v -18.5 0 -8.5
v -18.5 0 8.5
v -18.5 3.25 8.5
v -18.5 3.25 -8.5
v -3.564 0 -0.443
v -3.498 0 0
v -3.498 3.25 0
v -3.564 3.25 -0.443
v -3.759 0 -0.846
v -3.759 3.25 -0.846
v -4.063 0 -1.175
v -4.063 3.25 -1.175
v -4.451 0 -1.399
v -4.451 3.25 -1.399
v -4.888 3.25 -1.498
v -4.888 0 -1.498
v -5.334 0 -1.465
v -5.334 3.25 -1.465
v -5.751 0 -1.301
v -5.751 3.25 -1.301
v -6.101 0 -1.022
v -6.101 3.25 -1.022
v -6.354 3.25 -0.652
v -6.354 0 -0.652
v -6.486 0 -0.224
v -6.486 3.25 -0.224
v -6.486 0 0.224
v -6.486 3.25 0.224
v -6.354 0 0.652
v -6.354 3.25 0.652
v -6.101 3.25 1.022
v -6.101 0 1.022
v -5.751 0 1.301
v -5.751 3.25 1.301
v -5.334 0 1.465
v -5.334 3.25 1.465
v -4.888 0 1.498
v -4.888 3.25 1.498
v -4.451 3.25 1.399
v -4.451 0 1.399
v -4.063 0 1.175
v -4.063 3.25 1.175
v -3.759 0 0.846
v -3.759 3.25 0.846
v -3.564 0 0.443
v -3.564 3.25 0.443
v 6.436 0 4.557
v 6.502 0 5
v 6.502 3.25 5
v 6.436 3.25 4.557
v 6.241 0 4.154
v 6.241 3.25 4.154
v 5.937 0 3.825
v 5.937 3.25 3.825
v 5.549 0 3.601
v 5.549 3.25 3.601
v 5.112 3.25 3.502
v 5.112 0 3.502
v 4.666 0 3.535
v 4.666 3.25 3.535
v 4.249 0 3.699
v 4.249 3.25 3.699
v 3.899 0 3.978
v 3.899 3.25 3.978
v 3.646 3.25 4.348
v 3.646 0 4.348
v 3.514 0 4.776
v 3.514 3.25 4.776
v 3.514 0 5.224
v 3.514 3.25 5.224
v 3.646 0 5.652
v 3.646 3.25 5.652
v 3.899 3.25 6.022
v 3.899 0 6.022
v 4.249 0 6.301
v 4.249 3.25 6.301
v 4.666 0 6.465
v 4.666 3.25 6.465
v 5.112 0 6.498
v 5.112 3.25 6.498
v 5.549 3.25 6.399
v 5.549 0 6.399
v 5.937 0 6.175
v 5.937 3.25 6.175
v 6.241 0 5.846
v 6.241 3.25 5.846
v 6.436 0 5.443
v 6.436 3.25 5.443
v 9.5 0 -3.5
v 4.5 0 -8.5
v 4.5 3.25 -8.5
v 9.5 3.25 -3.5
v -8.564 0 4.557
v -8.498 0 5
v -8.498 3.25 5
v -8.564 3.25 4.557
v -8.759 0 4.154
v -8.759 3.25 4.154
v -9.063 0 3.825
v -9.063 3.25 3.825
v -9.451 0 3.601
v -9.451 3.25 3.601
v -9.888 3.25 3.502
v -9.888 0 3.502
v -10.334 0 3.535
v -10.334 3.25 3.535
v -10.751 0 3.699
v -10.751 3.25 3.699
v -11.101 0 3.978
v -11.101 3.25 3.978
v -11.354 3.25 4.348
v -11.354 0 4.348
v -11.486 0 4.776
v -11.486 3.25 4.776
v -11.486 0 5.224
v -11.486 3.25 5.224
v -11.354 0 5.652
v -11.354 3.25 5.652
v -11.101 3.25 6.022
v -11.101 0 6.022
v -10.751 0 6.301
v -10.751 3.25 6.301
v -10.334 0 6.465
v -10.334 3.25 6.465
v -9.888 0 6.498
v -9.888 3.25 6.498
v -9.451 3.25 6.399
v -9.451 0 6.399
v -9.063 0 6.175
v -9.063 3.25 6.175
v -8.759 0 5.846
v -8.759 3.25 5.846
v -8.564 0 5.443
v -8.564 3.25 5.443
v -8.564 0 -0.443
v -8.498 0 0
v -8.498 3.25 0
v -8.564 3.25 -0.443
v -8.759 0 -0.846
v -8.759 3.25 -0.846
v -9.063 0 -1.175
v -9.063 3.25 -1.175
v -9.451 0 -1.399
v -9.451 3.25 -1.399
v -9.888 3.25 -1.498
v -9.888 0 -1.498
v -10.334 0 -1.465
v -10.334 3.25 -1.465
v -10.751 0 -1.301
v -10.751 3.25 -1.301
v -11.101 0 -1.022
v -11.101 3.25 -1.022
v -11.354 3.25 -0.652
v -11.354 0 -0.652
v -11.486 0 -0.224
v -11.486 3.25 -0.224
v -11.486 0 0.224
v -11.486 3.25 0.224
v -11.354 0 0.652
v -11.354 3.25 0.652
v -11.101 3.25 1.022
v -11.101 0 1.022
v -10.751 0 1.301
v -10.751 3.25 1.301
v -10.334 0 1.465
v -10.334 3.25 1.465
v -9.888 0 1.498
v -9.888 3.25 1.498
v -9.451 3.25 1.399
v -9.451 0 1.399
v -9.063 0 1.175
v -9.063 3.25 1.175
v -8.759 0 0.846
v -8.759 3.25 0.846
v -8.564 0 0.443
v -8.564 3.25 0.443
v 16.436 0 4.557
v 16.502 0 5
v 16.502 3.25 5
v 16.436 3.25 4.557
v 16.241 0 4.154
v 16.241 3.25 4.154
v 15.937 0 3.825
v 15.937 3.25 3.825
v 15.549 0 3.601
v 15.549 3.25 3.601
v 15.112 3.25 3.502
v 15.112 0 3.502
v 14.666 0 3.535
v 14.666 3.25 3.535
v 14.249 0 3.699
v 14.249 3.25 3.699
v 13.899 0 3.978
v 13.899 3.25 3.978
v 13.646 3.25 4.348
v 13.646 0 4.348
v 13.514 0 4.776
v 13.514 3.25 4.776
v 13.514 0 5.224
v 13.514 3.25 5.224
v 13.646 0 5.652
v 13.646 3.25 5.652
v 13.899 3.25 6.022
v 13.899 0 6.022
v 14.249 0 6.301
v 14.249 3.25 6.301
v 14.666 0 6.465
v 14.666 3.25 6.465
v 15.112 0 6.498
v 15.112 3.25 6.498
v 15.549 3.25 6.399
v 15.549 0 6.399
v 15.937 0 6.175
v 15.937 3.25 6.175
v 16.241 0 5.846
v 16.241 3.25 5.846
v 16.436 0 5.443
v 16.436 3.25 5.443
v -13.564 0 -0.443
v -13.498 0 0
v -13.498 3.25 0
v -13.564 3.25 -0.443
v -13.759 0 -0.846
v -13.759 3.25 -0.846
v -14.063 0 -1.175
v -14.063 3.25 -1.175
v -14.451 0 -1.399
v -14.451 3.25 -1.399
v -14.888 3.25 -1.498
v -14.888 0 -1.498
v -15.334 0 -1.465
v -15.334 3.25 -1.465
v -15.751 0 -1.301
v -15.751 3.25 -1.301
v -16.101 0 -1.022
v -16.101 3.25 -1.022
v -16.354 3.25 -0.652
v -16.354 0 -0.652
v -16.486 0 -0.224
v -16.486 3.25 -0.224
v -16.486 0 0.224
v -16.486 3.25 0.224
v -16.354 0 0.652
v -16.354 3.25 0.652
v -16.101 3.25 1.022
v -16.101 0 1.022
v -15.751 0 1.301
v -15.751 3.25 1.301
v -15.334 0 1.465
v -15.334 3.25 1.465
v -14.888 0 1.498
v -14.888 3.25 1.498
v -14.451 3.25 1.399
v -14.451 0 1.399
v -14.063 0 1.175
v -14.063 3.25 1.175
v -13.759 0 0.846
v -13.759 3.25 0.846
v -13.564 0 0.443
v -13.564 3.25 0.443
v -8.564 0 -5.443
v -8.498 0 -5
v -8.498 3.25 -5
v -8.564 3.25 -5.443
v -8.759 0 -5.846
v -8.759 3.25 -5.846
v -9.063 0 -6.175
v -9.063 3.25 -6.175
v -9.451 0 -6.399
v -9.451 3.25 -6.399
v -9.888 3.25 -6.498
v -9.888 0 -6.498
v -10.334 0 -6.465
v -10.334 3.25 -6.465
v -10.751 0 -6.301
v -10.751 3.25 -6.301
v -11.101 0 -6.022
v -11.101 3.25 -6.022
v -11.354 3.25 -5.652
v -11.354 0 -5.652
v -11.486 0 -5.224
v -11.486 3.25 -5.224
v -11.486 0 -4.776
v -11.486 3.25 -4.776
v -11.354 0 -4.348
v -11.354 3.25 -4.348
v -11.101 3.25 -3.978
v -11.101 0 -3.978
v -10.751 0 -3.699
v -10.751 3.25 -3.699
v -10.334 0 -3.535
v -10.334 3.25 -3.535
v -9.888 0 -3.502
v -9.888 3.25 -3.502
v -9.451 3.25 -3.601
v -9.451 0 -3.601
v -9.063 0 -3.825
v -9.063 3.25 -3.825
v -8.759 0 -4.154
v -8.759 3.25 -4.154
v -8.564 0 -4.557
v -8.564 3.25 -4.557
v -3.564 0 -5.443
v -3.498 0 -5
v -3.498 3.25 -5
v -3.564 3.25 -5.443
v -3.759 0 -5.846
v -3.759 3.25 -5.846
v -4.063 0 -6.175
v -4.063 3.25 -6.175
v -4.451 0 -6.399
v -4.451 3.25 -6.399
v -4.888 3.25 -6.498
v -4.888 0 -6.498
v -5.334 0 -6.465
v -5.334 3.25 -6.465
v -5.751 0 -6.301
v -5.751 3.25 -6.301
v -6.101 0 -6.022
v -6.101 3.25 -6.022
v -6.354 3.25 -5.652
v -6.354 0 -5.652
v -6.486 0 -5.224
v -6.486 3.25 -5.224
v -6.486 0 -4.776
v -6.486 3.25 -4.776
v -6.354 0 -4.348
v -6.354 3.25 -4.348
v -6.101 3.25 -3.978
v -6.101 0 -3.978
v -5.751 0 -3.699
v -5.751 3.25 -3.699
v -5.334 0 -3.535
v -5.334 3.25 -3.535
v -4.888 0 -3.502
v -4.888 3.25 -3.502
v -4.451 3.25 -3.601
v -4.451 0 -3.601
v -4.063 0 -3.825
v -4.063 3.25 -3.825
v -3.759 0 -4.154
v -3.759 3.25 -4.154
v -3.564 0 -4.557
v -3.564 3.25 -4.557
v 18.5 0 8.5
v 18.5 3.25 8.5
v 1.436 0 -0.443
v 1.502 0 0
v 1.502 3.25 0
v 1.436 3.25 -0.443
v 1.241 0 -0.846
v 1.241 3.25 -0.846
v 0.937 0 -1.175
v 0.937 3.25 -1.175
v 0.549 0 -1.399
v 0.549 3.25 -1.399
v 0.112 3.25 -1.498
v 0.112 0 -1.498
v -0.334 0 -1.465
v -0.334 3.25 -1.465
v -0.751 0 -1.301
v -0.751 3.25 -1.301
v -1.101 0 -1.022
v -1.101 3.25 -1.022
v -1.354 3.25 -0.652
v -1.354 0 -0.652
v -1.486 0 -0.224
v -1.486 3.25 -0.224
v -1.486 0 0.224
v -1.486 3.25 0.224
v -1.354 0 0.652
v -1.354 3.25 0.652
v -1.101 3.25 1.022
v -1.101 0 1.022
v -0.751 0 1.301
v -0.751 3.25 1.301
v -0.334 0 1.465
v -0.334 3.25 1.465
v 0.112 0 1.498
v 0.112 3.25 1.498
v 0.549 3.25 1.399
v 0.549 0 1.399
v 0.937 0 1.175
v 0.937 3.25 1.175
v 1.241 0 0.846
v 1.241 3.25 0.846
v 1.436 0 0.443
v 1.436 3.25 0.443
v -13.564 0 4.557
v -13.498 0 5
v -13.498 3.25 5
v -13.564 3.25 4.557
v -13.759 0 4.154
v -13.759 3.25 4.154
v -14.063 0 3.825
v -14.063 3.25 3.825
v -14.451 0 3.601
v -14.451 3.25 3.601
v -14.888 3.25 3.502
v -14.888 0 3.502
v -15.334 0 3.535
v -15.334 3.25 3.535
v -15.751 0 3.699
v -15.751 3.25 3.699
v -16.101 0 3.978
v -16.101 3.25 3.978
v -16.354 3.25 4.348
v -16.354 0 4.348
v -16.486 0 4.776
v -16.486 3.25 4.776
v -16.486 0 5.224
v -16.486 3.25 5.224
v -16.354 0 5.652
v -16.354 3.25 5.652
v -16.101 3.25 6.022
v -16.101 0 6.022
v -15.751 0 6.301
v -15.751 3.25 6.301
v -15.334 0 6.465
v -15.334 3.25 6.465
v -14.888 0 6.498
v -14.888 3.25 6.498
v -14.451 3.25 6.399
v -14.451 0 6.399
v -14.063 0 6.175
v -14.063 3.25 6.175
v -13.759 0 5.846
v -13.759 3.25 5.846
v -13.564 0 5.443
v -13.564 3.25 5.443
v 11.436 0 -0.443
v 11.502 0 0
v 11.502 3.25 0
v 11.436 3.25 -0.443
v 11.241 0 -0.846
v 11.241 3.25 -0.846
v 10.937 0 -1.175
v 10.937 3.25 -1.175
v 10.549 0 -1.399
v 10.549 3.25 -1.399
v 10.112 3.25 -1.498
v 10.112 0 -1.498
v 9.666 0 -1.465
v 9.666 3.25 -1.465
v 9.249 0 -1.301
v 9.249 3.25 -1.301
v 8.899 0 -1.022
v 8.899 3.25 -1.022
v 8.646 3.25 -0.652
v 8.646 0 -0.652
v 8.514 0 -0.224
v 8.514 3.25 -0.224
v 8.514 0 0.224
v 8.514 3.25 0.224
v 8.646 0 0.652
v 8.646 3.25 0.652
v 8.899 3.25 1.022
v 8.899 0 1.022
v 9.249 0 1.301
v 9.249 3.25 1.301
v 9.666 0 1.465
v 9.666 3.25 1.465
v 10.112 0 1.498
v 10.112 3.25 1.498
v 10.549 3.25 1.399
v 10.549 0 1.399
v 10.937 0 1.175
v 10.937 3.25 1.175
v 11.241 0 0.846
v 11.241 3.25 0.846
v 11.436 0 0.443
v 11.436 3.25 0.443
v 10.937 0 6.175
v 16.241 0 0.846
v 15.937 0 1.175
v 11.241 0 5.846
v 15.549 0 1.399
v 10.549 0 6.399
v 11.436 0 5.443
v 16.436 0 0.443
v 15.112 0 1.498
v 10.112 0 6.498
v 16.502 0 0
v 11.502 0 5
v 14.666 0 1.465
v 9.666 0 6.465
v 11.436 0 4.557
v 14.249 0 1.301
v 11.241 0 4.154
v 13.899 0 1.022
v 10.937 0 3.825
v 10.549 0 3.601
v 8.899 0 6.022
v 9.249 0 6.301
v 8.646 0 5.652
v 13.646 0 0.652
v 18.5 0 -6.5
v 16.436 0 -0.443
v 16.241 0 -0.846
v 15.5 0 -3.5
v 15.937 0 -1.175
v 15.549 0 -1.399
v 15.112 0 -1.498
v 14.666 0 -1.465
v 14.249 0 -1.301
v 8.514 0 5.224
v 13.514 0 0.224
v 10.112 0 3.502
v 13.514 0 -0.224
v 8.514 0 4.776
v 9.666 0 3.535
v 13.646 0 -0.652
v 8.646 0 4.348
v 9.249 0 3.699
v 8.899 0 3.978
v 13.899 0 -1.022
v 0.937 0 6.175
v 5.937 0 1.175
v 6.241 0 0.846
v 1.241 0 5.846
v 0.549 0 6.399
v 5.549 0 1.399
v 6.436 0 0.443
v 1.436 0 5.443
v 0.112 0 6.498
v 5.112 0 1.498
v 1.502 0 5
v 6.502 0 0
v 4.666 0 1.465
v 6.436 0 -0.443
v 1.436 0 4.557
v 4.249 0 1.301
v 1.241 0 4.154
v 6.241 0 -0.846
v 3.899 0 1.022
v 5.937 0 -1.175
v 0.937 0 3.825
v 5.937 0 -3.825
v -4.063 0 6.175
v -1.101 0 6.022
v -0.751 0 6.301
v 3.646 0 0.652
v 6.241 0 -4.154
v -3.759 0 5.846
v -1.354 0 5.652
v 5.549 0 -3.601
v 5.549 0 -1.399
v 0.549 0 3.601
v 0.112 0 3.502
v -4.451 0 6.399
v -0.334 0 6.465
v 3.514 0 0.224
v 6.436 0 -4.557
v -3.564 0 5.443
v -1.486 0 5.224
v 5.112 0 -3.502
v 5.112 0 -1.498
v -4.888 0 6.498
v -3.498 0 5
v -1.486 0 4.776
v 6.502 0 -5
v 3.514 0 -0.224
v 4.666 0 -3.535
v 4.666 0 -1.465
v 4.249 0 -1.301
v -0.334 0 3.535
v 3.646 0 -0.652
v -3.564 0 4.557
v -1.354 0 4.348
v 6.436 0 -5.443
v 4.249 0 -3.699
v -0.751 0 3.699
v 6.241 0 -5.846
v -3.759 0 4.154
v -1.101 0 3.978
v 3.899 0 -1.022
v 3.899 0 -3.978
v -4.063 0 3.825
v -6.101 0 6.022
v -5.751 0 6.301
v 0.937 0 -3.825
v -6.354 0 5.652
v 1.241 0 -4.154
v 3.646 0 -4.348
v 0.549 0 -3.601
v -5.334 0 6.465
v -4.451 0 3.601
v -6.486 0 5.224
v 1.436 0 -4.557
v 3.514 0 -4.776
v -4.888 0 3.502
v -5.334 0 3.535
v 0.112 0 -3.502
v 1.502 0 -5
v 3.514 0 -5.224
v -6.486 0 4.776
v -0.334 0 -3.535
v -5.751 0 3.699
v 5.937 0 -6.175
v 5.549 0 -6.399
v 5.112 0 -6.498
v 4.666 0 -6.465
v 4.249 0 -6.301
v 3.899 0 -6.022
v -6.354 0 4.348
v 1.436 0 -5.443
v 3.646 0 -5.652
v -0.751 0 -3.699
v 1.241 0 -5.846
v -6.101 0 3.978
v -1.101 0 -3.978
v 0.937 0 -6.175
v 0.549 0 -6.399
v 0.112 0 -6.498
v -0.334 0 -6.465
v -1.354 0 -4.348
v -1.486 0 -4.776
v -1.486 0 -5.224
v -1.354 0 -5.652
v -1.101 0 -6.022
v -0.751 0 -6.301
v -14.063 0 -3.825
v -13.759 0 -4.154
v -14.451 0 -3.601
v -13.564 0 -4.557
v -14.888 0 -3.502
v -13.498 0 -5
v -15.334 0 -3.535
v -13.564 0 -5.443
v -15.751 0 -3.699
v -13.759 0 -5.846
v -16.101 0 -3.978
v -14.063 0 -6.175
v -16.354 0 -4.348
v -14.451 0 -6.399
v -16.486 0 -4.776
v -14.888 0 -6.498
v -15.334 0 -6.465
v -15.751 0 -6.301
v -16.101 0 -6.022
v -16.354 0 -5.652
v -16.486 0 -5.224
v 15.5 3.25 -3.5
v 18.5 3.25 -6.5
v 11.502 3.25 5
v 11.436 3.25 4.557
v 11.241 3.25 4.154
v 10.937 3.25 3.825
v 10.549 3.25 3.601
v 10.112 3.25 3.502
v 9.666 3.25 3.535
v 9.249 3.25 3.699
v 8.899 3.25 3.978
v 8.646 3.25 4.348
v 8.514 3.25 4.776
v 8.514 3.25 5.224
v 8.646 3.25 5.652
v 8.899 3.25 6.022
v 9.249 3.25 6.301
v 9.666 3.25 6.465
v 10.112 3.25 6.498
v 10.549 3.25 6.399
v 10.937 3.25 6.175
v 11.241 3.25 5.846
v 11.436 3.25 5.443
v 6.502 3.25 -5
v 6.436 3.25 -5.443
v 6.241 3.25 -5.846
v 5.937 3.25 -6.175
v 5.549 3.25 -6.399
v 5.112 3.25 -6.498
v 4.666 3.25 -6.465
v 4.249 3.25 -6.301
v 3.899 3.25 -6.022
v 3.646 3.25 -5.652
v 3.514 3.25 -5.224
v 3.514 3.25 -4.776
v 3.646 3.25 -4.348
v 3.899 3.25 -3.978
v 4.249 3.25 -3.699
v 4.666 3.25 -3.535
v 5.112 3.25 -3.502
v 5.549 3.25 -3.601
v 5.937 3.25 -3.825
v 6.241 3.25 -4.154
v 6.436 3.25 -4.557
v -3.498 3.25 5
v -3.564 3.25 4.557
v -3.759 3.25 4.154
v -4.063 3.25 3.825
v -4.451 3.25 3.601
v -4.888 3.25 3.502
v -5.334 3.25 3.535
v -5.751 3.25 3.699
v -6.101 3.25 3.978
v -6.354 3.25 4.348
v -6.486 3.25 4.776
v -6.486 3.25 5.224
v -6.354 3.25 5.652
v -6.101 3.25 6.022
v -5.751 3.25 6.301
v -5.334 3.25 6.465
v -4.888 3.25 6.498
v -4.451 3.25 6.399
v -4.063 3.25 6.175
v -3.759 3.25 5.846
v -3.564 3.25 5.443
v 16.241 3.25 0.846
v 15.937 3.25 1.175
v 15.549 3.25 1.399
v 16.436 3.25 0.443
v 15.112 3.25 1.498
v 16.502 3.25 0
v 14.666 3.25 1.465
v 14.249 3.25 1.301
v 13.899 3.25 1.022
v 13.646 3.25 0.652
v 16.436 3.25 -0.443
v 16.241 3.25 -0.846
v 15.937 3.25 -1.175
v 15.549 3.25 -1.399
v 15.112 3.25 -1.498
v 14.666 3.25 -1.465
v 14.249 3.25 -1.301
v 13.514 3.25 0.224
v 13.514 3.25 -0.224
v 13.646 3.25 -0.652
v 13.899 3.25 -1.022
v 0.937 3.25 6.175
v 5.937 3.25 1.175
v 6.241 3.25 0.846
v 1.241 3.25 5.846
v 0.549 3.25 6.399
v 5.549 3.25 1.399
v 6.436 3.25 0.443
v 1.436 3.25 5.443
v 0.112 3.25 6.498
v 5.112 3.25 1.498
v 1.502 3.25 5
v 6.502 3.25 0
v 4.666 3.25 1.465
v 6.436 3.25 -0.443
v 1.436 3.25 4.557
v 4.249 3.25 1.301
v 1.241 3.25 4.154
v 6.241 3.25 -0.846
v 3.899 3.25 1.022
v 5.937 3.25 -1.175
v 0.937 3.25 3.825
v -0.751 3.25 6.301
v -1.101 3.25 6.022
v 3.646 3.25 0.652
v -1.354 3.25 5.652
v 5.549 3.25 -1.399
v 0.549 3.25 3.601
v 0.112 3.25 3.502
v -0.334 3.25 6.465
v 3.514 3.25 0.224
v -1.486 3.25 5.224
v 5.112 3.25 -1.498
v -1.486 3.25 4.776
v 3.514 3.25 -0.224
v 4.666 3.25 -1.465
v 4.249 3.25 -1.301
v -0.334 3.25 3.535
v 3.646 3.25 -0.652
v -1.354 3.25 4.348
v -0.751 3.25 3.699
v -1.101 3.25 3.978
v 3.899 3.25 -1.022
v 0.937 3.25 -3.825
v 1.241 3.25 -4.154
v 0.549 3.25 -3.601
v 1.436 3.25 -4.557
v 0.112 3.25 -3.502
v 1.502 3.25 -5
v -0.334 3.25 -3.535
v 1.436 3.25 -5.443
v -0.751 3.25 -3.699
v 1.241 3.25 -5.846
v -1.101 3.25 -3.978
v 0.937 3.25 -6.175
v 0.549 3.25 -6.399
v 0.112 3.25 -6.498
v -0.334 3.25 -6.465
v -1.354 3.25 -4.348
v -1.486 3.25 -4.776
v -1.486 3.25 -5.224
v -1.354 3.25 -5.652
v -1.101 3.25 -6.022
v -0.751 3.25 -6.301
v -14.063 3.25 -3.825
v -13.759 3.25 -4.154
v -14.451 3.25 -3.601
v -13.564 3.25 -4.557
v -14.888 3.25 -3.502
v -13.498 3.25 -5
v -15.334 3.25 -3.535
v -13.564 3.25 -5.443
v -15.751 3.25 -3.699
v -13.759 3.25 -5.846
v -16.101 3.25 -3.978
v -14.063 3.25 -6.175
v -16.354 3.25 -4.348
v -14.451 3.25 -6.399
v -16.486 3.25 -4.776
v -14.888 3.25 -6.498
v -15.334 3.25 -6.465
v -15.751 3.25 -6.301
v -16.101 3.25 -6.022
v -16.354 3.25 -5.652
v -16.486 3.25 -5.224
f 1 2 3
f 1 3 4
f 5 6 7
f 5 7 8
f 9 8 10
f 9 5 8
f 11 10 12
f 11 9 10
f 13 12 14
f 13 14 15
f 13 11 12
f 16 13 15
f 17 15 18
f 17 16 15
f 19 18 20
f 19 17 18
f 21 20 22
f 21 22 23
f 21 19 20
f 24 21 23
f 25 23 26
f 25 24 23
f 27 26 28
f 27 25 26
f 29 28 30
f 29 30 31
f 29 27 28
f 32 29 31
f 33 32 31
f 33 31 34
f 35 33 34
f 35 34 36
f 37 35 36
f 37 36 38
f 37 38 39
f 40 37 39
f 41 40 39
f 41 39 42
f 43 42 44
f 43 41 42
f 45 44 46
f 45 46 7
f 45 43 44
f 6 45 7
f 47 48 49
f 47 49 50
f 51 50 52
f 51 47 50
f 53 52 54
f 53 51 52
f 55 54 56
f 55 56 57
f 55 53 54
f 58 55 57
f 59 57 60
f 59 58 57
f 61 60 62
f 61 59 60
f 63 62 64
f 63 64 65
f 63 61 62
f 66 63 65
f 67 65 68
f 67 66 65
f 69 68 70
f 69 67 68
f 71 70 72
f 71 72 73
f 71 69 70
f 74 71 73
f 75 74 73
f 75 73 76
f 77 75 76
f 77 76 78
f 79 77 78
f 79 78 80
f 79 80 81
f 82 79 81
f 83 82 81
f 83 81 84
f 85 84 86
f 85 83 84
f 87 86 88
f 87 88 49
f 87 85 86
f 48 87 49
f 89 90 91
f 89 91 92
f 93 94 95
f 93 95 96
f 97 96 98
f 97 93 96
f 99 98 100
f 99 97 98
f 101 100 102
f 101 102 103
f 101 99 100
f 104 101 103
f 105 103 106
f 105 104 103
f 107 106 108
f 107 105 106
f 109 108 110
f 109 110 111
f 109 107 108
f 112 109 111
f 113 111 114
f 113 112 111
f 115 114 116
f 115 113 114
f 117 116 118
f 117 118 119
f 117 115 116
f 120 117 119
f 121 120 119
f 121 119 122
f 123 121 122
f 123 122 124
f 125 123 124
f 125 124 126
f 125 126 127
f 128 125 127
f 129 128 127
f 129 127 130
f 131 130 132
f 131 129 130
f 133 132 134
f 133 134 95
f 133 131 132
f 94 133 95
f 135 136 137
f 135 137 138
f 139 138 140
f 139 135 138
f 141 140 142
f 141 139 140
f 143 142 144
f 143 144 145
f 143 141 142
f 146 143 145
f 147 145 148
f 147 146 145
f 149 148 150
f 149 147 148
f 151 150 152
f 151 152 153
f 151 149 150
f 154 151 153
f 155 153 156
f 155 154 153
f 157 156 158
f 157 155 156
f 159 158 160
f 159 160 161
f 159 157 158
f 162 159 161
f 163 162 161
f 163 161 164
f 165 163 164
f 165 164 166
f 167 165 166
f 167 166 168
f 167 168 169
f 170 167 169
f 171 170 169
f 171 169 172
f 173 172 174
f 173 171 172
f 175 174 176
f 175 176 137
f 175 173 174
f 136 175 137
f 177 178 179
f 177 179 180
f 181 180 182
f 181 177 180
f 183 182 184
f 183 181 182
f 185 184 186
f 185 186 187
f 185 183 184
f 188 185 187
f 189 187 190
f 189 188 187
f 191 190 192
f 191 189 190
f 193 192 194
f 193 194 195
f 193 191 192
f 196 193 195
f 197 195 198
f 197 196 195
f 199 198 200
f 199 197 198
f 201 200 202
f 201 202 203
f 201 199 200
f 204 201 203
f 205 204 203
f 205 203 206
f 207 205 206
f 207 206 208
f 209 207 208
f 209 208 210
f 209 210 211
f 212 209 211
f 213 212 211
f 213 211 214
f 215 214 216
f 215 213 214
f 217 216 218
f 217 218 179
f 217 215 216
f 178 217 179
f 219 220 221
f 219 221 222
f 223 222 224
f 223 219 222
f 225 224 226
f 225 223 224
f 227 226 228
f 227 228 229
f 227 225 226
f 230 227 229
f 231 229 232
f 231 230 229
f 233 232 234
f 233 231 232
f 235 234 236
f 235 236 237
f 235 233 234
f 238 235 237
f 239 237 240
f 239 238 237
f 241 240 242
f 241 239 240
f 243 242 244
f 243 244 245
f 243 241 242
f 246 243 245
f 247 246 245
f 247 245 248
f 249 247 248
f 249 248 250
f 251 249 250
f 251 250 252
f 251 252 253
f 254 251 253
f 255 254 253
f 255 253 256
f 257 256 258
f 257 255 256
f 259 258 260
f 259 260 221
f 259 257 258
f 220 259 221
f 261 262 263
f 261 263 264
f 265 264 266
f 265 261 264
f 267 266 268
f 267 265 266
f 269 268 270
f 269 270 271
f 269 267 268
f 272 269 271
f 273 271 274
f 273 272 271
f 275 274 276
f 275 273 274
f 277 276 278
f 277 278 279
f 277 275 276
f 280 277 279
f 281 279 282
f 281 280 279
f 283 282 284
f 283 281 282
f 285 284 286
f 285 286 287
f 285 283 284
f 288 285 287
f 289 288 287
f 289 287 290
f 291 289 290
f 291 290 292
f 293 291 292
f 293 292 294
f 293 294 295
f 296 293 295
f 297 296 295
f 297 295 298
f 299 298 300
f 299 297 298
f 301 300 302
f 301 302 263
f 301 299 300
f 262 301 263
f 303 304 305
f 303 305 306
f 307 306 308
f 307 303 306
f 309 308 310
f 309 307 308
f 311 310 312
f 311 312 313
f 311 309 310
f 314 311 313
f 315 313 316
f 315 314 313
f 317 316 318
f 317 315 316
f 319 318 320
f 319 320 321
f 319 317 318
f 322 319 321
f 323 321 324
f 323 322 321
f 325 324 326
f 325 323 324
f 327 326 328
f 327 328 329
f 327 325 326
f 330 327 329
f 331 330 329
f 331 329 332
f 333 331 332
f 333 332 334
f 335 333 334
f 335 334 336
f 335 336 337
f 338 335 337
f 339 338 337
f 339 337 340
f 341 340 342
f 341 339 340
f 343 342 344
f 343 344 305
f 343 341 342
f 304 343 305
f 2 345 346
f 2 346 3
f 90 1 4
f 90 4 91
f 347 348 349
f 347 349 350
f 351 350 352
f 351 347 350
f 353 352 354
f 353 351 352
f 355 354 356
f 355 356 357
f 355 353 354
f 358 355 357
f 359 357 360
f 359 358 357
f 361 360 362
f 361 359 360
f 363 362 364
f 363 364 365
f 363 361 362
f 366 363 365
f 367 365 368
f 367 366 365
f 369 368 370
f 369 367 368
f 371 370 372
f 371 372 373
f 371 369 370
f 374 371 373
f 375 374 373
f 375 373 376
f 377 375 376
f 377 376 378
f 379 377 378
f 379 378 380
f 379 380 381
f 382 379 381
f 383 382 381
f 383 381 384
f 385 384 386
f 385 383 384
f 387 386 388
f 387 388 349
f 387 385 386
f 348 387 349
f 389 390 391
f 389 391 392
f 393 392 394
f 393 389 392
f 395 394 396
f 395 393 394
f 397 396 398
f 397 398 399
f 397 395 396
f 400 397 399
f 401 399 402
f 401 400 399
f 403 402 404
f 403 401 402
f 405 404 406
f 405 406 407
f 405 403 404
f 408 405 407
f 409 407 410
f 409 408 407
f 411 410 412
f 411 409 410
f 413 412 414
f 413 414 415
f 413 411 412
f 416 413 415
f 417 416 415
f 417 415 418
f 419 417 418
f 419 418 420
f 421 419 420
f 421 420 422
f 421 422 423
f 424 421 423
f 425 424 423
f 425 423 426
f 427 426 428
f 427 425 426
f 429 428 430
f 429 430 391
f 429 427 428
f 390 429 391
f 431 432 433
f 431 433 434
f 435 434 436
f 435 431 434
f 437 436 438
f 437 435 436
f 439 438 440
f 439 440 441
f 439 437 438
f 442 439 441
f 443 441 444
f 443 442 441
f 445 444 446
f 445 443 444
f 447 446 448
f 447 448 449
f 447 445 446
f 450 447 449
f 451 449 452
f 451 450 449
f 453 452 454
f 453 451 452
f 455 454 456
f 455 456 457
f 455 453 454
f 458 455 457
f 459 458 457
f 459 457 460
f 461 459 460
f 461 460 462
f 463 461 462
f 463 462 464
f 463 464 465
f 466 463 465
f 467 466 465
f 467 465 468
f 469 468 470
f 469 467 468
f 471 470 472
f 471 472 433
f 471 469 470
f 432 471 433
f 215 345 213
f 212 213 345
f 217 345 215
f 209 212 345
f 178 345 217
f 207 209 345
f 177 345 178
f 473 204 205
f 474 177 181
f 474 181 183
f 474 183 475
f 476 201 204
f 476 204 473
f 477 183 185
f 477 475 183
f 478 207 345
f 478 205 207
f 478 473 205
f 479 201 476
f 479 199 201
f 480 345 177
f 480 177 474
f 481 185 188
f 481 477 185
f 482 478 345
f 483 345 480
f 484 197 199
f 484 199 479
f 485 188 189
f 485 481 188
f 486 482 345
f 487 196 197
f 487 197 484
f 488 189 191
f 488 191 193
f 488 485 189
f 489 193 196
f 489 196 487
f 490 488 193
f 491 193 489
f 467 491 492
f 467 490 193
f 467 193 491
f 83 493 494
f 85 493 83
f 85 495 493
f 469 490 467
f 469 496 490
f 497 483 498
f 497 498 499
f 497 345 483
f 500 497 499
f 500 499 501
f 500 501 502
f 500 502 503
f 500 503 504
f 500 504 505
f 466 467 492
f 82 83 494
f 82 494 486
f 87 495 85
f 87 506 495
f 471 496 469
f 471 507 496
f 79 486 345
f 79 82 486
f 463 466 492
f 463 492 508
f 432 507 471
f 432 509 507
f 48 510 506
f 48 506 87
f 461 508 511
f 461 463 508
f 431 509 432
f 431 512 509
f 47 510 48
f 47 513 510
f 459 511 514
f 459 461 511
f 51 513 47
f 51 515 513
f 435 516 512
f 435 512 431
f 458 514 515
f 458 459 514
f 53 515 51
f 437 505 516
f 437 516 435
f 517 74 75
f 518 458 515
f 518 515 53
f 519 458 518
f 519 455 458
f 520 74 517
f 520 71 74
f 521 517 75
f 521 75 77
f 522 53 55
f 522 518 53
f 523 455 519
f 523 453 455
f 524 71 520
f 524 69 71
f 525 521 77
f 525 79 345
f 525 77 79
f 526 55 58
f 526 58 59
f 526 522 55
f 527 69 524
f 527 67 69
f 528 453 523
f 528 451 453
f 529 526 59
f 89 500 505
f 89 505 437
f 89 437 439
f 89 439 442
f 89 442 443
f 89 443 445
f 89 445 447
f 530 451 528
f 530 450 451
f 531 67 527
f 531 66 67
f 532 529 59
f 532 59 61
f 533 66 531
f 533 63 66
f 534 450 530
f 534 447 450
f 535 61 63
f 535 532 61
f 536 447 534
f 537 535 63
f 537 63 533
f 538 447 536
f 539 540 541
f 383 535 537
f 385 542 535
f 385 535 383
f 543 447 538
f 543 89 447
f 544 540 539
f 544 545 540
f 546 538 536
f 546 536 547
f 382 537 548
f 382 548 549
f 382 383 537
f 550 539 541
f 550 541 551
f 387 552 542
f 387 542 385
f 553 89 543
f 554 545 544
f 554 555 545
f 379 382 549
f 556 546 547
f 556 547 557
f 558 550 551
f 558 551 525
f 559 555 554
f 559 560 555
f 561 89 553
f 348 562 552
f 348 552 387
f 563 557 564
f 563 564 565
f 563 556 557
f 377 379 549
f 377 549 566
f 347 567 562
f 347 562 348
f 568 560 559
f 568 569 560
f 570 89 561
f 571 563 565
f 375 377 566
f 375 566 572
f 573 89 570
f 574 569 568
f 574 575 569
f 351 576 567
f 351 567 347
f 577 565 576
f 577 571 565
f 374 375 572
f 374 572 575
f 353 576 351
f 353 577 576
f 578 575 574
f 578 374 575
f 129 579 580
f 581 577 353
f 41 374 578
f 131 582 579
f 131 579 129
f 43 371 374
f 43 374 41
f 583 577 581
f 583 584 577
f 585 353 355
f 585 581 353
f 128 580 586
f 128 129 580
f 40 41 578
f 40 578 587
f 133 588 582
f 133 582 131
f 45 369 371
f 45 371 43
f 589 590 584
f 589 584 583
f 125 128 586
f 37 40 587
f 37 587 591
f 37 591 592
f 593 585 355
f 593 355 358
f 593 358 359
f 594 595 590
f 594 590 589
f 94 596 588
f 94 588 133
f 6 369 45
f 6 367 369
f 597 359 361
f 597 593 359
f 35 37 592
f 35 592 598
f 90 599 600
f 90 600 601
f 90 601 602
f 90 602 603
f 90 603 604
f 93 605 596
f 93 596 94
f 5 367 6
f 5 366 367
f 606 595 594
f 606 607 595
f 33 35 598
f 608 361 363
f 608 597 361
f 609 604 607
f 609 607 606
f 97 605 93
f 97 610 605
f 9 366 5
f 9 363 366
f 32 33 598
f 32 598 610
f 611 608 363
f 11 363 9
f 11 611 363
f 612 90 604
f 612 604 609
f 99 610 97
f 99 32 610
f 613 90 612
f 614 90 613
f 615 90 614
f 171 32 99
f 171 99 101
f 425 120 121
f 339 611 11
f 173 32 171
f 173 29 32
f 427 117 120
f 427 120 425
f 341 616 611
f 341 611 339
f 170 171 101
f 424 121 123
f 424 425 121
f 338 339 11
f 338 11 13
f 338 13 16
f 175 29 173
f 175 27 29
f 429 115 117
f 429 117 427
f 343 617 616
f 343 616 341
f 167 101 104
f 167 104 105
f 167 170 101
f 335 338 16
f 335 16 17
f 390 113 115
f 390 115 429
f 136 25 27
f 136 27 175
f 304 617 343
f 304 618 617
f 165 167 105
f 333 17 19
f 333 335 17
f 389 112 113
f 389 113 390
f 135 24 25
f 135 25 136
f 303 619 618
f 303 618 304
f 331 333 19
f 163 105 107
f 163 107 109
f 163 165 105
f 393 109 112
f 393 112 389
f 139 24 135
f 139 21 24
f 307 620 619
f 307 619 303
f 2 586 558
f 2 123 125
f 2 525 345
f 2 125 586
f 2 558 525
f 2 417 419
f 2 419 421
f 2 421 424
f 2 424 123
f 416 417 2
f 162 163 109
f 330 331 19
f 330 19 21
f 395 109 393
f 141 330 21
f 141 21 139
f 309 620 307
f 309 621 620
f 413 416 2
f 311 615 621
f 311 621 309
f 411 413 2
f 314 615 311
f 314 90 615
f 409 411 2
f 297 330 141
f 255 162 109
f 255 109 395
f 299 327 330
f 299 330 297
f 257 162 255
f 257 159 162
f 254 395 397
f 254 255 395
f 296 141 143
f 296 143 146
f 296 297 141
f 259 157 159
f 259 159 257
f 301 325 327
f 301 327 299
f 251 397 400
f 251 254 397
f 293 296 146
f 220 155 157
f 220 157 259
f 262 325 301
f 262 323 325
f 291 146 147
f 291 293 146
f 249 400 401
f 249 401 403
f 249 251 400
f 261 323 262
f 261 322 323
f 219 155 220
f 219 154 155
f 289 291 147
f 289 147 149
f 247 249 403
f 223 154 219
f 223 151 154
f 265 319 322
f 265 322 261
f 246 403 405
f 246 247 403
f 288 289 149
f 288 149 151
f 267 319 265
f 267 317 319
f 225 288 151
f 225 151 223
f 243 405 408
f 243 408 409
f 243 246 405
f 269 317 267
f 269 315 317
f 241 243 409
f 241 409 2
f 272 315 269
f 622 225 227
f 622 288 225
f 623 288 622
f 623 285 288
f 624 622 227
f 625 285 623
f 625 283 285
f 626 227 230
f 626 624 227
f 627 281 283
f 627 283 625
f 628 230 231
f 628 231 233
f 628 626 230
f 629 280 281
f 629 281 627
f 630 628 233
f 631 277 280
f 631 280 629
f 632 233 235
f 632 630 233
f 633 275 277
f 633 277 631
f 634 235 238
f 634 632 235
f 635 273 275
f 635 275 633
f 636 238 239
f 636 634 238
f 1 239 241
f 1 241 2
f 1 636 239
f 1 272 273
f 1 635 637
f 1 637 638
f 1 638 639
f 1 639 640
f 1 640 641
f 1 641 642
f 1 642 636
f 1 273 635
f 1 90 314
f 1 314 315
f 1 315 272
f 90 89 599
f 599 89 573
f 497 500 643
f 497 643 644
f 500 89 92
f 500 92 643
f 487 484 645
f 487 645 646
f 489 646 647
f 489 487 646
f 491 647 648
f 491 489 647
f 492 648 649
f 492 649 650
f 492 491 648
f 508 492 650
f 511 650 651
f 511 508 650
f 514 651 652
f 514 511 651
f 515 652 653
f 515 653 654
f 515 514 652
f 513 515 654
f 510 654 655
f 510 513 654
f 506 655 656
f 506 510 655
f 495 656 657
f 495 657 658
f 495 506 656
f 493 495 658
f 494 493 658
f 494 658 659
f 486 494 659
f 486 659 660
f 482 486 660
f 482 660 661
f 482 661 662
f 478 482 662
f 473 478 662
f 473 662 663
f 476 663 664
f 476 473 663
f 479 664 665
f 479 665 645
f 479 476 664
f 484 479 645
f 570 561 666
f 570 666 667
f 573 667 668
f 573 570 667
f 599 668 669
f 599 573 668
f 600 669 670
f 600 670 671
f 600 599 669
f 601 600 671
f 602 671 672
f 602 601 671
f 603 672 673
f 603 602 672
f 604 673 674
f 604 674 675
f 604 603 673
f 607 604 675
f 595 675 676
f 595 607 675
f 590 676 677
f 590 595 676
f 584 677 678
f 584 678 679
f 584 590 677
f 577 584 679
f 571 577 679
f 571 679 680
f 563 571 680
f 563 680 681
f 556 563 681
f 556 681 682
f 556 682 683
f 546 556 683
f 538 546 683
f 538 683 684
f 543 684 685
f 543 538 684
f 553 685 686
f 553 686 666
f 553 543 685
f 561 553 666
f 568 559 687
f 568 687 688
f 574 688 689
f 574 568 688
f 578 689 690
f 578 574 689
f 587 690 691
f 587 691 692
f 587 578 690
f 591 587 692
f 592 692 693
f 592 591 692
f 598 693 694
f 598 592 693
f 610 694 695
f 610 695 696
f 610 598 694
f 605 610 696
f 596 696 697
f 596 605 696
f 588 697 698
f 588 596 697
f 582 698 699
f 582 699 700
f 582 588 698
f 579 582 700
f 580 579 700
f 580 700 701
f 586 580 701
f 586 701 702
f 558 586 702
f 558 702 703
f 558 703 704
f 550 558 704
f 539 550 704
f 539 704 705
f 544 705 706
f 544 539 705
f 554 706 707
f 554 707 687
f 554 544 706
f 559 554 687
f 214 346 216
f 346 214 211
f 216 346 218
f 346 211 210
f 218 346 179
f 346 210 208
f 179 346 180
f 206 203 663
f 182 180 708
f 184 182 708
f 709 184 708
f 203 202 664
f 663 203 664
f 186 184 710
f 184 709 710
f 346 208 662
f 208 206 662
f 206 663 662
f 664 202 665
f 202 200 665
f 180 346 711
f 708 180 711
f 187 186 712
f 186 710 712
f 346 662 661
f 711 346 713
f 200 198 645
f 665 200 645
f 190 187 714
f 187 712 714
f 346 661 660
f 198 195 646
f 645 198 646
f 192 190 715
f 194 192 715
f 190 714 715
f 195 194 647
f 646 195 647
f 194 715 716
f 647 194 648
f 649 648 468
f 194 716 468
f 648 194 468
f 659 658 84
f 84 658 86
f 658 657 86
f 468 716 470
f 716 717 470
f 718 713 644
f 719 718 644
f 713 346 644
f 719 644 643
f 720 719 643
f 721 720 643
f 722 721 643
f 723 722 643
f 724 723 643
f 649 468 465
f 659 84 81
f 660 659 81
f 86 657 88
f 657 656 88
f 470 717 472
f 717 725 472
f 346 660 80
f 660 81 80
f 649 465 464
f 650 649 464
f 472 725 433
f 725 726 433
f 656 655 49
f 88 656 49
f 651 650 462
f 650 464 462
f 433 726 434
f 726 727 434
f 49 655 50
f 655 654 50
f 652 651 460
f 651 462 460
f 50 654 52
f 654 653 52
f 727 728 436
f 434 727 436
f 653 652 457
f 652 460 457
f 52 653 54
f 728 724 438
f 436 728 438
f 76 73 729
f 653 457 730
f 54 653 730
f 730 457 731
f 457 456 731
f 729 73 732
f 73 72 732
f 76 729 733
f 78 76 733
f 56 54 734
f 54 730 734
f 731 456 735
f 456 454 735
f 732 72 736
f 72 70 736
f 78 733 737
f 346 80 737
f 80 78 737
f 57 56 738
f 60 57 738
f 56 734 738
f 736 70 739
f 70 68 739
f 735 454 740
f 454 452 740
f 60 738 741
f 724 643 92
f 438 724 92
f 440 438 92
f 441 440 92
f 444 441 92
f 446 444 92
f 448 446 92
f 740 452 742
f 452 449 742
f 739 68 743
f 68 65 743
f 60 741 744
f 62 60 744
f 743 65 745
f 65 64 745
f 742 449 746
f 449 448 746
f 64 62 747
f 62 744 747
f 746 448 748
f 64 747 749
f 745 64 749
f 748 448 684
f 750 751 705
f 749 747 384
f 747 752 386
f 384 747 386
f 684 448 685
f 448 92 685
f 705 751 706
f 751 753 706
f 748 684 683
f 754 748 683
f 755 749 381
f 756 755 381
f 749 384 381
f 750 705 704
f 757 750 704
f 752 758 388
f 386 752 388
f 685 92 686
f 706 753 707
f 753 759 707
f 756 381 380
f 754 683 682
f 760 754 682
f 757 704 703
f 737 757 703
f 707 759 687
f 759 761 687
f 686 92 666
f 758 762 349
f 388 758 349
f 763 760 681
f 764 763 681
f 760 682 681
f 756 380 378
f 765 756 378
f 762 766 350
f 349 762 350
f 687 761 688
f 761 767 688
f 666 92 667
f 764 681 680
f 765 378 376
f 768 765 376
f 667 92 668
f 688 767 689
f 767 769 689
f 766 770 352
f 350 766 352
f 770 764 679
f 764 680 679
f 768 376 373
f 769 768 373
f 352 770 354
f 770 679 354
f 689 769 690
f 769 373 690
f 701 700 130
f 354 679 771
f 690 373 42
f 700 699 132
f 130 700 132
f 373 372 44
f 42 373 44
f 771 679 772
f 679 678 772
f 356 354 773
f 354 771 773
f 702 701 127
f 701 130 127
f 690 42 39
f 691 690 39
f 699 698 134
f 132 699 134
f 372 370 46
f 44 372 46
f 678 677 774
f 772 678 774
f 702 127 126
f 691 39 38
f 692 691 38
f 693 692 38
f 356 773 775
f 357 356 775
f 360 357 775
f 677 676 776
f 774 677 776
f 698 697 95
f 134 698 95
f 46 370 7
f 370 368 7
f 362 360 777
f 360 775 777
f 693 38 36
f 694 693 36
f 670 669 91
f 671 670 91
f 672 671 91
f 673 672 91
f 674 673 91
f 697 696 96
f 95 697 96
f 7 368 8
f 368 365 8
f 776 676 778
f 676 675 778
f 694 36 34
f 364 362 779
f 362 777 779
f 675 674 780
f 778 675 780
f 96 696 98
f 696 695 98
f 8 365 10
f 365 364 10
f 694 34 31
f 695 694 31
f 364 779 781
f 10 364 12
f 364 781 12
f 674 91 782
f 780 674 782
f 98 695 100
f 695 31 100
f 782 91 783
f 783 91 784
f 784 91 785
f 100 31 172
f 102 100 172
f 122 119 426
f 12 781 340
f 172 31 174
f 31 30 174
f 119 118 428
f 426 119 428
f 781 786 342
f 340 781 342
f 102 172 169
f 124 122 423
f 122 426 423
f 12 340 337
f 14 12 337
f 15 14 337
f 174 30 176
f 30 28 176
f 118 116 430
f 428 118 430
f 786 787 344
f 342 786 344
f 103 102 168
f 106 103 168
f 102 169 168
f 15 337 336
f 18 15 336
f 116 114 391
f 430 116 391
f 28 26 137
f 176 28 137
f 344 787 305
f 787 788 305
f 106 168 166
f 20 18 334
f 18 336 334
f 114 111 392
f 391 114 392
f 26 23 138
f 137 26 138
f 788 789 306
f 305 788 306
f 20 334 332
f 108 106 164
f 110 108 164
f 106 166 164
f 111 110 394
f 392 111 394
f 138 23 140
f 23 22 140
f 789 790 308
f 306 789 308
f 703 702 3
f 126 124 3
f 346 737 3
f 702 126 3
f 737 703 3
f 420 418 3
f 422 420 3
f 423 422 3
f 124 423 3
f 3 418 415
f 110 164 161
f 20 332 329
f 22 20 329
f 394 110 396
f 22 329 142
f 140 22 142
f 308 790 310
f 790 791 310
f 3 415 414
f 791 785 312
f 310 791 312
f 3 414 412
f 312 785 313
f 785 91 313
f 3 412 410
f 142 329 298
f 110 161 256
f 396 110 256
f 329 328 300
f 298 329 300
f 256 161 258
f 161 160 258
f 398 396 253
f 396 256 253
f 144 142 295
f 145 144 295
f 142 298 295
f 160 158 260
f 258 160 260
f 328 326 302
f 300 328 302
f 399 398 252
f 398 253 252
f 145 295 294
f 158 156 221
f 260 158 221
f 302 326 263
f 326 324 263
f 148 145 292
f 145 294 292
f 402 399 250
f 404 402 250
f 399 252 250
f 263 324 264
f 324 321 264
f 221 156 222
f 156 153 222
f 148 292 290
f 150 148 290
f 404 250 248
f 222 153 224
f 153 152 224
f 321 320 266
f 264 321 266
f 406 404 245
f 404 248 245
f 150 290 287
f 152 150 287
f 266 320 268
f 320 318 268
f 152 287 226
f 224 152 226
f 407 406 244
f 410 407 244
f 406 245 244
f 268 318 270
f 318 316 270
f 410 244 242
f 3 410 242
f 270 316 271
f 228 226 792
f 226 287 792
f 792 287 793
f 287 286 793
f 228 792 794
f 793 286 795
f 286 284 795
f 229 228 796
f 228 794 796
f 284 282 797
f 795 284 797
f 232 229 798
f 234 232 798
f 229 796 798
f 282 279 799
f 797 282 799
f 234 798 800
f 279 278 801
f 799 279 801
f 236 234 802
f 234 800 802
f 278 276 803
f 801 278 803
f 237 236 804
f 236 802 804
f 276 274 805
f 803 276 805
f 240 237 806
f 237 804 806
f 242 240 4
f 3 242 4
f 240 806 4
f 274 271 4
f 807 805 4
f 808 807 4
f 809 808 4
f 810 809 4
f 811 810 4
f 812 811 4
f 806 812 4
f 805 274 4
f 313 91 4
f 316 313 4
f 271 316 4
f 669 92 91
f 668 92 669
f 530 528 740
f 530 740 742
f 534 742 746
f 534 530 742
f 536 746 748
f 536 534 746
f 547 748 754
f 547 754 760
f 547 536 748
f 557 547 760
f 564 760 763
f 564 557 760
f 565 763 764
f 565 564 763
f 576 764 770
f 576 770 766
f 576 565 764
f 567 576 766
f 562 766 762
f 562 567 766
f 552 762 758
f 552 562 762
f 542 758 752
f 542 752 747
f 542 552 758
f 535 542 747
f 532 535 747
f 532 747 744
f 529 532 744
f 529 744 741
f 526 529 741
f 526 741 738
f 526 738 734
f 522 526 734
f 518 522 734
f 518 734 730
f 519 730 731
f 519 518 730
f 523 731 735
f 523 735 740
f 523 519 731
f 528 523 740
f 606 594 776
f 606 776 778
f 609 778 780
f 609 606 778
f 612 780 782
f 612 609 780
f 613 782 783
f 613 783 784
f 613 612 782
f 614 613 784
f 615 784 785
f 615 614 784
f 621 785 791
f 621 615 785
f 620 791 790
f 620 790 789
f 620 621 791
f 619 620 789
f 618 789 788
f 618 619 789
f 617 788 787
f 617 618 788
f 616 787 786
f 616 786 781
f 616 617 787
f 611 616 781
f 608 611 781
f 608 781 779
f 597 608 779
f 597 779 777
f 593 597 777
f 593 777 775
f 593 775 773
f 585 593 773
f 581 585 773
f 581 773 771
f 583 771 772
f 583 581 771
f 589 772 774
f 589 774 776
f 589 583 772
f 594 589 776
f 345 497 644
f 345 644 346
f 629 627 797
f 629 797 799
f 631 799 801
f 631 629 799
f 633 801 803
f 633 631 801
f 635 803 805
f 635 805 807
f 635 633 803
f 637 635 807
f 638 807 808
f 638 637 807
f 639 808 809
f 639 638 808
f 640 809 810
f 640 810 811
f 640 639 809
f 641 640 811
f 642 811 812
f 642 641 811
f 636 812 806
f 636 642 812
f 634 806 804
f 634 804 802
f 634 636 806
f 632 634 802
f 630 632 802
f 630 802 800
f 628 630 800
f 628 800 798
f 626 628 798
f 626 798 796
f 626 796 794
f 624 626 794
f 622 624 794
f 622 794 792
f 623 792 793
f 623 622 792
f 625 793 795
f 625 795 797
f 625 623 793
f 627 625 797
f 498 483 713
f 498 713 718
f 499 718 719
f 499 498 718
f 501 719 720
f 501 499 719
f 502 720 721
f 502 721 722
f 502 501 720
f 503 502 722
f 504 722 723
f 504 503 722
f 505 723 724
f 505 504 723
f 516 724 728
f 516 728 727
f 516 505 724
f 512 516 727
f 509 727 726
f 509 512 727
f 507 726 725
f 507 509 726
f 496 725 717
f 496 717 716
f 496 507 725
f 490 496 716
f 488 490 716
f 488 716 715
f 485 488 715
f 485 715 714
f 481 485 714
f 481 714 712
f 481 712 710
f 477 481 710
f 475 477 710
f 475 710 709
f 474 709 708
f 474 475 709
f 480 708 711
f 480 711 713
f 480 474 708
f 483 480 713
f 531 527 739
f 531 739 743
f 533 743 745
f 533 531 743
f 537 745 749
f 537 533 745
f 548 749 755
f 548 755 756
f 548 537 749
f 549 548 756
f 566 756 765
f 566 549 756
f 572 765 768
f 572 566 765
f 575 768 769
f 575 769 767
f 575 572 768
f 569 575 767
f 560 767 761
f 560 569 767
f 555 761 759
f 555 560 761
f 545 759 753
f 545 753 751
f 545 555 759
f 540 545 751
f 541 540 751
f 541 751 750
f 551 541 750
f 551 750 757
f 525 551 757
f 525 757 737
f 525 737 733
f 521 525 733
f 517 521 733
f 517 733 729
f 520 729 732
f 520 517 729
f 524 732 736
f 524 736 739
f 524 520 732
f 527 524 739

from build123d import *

# Parameters (mm, degrees)
SKETCH1_R           = 1.5025
BOSS_EXTRUDE1_DEPTH = 3.25


with BuildPart() as part:
    # Sketch1 → Boss-Extrude1 (new body)
    with BuildSketch(Plane(origin=(0, 0, 0), x_dir=(1, 0, 0), z_dir=(0, 1, 0))):
        Polygon((-18.5, 8.5), (4.5, 8.5), (9.5, 3.5), (15.5, 3.5), (18.5, 6.5), (18.5, -8.5), (-18.5, -8.5), align=None)
        with Locations((-15, -5)):
            Circle(SKETCH1_R, mode=Mode.SUBTRACT)
        with Locations((-10, -5)):
            Circle(SKETCH1_R, mode=Mode.SUBTRACT)
        with Locations((-5, -5)):
            Circle(SKETCH1_R, mode=Mode.SUBTRACT)
        with Locations((0, -5)):
            Circle(SKETCH1_R, mode=Mode.SUBTRACT)
        with Locations((5, -5)):
            Circle(SKETCH1_R, mode=Mode.SUBTRACT)
        with Locations((10, -5)):
            Circle(SKETCH1_R, mode=Mode.SUBTRACT)
        with Locations((15, -5)):
            Circle(SKETCH1_R, mode=Mode.SUBTRACT)
        with Locations((-10, 0)):
            Circle(SKETCH1_R, mode=Mode.SUBTRACT)
        with Locations((-5, 0)):
            Circle(SKETCH1_R, mode=Mode.SUBTRACT)
        Circle(SKETCH1_R, mode=Mode.SUBTRACT)
        with Locations((5, 0)):
            Circle(SKETCH1_R, mode=Mode.SUBTRACT)
        with Locations((10, 0)):
            Circle(SKETCH1_R, mode=Mode.SUBTRACT)
        with Locations((15, 0)):
            Circle(SKETCH1_R, mode=Mode.SUBTRACT)
        with Locations((-10, 5)):
            Circle(SKETCH1_R, mode=Mode.SUBTRACT)
        with Locations((-5, 5)):
            Circle(SKETCH1_R, mode=Mode.SUBTRACT)
        with Locations((0, 5)):
            Circle(SKETCH1_R, mode=Mode.SUBTRACT)
        with Locations((5, 5)):
            Circle(SKETCH1_R, mode=Mode.SUBTRACT)
        with Locations((-15, 0)):
            Circle(SKETCH1_R, mode=Mode.SUBTRACT)
        with Locations((-15, 5)):
            Circle(SKETCH1_R, mode=Mode.SUBTRACT)
    extrude(amount=BOSS_EXTRUDE1_DEPTH)


solid = part.part
